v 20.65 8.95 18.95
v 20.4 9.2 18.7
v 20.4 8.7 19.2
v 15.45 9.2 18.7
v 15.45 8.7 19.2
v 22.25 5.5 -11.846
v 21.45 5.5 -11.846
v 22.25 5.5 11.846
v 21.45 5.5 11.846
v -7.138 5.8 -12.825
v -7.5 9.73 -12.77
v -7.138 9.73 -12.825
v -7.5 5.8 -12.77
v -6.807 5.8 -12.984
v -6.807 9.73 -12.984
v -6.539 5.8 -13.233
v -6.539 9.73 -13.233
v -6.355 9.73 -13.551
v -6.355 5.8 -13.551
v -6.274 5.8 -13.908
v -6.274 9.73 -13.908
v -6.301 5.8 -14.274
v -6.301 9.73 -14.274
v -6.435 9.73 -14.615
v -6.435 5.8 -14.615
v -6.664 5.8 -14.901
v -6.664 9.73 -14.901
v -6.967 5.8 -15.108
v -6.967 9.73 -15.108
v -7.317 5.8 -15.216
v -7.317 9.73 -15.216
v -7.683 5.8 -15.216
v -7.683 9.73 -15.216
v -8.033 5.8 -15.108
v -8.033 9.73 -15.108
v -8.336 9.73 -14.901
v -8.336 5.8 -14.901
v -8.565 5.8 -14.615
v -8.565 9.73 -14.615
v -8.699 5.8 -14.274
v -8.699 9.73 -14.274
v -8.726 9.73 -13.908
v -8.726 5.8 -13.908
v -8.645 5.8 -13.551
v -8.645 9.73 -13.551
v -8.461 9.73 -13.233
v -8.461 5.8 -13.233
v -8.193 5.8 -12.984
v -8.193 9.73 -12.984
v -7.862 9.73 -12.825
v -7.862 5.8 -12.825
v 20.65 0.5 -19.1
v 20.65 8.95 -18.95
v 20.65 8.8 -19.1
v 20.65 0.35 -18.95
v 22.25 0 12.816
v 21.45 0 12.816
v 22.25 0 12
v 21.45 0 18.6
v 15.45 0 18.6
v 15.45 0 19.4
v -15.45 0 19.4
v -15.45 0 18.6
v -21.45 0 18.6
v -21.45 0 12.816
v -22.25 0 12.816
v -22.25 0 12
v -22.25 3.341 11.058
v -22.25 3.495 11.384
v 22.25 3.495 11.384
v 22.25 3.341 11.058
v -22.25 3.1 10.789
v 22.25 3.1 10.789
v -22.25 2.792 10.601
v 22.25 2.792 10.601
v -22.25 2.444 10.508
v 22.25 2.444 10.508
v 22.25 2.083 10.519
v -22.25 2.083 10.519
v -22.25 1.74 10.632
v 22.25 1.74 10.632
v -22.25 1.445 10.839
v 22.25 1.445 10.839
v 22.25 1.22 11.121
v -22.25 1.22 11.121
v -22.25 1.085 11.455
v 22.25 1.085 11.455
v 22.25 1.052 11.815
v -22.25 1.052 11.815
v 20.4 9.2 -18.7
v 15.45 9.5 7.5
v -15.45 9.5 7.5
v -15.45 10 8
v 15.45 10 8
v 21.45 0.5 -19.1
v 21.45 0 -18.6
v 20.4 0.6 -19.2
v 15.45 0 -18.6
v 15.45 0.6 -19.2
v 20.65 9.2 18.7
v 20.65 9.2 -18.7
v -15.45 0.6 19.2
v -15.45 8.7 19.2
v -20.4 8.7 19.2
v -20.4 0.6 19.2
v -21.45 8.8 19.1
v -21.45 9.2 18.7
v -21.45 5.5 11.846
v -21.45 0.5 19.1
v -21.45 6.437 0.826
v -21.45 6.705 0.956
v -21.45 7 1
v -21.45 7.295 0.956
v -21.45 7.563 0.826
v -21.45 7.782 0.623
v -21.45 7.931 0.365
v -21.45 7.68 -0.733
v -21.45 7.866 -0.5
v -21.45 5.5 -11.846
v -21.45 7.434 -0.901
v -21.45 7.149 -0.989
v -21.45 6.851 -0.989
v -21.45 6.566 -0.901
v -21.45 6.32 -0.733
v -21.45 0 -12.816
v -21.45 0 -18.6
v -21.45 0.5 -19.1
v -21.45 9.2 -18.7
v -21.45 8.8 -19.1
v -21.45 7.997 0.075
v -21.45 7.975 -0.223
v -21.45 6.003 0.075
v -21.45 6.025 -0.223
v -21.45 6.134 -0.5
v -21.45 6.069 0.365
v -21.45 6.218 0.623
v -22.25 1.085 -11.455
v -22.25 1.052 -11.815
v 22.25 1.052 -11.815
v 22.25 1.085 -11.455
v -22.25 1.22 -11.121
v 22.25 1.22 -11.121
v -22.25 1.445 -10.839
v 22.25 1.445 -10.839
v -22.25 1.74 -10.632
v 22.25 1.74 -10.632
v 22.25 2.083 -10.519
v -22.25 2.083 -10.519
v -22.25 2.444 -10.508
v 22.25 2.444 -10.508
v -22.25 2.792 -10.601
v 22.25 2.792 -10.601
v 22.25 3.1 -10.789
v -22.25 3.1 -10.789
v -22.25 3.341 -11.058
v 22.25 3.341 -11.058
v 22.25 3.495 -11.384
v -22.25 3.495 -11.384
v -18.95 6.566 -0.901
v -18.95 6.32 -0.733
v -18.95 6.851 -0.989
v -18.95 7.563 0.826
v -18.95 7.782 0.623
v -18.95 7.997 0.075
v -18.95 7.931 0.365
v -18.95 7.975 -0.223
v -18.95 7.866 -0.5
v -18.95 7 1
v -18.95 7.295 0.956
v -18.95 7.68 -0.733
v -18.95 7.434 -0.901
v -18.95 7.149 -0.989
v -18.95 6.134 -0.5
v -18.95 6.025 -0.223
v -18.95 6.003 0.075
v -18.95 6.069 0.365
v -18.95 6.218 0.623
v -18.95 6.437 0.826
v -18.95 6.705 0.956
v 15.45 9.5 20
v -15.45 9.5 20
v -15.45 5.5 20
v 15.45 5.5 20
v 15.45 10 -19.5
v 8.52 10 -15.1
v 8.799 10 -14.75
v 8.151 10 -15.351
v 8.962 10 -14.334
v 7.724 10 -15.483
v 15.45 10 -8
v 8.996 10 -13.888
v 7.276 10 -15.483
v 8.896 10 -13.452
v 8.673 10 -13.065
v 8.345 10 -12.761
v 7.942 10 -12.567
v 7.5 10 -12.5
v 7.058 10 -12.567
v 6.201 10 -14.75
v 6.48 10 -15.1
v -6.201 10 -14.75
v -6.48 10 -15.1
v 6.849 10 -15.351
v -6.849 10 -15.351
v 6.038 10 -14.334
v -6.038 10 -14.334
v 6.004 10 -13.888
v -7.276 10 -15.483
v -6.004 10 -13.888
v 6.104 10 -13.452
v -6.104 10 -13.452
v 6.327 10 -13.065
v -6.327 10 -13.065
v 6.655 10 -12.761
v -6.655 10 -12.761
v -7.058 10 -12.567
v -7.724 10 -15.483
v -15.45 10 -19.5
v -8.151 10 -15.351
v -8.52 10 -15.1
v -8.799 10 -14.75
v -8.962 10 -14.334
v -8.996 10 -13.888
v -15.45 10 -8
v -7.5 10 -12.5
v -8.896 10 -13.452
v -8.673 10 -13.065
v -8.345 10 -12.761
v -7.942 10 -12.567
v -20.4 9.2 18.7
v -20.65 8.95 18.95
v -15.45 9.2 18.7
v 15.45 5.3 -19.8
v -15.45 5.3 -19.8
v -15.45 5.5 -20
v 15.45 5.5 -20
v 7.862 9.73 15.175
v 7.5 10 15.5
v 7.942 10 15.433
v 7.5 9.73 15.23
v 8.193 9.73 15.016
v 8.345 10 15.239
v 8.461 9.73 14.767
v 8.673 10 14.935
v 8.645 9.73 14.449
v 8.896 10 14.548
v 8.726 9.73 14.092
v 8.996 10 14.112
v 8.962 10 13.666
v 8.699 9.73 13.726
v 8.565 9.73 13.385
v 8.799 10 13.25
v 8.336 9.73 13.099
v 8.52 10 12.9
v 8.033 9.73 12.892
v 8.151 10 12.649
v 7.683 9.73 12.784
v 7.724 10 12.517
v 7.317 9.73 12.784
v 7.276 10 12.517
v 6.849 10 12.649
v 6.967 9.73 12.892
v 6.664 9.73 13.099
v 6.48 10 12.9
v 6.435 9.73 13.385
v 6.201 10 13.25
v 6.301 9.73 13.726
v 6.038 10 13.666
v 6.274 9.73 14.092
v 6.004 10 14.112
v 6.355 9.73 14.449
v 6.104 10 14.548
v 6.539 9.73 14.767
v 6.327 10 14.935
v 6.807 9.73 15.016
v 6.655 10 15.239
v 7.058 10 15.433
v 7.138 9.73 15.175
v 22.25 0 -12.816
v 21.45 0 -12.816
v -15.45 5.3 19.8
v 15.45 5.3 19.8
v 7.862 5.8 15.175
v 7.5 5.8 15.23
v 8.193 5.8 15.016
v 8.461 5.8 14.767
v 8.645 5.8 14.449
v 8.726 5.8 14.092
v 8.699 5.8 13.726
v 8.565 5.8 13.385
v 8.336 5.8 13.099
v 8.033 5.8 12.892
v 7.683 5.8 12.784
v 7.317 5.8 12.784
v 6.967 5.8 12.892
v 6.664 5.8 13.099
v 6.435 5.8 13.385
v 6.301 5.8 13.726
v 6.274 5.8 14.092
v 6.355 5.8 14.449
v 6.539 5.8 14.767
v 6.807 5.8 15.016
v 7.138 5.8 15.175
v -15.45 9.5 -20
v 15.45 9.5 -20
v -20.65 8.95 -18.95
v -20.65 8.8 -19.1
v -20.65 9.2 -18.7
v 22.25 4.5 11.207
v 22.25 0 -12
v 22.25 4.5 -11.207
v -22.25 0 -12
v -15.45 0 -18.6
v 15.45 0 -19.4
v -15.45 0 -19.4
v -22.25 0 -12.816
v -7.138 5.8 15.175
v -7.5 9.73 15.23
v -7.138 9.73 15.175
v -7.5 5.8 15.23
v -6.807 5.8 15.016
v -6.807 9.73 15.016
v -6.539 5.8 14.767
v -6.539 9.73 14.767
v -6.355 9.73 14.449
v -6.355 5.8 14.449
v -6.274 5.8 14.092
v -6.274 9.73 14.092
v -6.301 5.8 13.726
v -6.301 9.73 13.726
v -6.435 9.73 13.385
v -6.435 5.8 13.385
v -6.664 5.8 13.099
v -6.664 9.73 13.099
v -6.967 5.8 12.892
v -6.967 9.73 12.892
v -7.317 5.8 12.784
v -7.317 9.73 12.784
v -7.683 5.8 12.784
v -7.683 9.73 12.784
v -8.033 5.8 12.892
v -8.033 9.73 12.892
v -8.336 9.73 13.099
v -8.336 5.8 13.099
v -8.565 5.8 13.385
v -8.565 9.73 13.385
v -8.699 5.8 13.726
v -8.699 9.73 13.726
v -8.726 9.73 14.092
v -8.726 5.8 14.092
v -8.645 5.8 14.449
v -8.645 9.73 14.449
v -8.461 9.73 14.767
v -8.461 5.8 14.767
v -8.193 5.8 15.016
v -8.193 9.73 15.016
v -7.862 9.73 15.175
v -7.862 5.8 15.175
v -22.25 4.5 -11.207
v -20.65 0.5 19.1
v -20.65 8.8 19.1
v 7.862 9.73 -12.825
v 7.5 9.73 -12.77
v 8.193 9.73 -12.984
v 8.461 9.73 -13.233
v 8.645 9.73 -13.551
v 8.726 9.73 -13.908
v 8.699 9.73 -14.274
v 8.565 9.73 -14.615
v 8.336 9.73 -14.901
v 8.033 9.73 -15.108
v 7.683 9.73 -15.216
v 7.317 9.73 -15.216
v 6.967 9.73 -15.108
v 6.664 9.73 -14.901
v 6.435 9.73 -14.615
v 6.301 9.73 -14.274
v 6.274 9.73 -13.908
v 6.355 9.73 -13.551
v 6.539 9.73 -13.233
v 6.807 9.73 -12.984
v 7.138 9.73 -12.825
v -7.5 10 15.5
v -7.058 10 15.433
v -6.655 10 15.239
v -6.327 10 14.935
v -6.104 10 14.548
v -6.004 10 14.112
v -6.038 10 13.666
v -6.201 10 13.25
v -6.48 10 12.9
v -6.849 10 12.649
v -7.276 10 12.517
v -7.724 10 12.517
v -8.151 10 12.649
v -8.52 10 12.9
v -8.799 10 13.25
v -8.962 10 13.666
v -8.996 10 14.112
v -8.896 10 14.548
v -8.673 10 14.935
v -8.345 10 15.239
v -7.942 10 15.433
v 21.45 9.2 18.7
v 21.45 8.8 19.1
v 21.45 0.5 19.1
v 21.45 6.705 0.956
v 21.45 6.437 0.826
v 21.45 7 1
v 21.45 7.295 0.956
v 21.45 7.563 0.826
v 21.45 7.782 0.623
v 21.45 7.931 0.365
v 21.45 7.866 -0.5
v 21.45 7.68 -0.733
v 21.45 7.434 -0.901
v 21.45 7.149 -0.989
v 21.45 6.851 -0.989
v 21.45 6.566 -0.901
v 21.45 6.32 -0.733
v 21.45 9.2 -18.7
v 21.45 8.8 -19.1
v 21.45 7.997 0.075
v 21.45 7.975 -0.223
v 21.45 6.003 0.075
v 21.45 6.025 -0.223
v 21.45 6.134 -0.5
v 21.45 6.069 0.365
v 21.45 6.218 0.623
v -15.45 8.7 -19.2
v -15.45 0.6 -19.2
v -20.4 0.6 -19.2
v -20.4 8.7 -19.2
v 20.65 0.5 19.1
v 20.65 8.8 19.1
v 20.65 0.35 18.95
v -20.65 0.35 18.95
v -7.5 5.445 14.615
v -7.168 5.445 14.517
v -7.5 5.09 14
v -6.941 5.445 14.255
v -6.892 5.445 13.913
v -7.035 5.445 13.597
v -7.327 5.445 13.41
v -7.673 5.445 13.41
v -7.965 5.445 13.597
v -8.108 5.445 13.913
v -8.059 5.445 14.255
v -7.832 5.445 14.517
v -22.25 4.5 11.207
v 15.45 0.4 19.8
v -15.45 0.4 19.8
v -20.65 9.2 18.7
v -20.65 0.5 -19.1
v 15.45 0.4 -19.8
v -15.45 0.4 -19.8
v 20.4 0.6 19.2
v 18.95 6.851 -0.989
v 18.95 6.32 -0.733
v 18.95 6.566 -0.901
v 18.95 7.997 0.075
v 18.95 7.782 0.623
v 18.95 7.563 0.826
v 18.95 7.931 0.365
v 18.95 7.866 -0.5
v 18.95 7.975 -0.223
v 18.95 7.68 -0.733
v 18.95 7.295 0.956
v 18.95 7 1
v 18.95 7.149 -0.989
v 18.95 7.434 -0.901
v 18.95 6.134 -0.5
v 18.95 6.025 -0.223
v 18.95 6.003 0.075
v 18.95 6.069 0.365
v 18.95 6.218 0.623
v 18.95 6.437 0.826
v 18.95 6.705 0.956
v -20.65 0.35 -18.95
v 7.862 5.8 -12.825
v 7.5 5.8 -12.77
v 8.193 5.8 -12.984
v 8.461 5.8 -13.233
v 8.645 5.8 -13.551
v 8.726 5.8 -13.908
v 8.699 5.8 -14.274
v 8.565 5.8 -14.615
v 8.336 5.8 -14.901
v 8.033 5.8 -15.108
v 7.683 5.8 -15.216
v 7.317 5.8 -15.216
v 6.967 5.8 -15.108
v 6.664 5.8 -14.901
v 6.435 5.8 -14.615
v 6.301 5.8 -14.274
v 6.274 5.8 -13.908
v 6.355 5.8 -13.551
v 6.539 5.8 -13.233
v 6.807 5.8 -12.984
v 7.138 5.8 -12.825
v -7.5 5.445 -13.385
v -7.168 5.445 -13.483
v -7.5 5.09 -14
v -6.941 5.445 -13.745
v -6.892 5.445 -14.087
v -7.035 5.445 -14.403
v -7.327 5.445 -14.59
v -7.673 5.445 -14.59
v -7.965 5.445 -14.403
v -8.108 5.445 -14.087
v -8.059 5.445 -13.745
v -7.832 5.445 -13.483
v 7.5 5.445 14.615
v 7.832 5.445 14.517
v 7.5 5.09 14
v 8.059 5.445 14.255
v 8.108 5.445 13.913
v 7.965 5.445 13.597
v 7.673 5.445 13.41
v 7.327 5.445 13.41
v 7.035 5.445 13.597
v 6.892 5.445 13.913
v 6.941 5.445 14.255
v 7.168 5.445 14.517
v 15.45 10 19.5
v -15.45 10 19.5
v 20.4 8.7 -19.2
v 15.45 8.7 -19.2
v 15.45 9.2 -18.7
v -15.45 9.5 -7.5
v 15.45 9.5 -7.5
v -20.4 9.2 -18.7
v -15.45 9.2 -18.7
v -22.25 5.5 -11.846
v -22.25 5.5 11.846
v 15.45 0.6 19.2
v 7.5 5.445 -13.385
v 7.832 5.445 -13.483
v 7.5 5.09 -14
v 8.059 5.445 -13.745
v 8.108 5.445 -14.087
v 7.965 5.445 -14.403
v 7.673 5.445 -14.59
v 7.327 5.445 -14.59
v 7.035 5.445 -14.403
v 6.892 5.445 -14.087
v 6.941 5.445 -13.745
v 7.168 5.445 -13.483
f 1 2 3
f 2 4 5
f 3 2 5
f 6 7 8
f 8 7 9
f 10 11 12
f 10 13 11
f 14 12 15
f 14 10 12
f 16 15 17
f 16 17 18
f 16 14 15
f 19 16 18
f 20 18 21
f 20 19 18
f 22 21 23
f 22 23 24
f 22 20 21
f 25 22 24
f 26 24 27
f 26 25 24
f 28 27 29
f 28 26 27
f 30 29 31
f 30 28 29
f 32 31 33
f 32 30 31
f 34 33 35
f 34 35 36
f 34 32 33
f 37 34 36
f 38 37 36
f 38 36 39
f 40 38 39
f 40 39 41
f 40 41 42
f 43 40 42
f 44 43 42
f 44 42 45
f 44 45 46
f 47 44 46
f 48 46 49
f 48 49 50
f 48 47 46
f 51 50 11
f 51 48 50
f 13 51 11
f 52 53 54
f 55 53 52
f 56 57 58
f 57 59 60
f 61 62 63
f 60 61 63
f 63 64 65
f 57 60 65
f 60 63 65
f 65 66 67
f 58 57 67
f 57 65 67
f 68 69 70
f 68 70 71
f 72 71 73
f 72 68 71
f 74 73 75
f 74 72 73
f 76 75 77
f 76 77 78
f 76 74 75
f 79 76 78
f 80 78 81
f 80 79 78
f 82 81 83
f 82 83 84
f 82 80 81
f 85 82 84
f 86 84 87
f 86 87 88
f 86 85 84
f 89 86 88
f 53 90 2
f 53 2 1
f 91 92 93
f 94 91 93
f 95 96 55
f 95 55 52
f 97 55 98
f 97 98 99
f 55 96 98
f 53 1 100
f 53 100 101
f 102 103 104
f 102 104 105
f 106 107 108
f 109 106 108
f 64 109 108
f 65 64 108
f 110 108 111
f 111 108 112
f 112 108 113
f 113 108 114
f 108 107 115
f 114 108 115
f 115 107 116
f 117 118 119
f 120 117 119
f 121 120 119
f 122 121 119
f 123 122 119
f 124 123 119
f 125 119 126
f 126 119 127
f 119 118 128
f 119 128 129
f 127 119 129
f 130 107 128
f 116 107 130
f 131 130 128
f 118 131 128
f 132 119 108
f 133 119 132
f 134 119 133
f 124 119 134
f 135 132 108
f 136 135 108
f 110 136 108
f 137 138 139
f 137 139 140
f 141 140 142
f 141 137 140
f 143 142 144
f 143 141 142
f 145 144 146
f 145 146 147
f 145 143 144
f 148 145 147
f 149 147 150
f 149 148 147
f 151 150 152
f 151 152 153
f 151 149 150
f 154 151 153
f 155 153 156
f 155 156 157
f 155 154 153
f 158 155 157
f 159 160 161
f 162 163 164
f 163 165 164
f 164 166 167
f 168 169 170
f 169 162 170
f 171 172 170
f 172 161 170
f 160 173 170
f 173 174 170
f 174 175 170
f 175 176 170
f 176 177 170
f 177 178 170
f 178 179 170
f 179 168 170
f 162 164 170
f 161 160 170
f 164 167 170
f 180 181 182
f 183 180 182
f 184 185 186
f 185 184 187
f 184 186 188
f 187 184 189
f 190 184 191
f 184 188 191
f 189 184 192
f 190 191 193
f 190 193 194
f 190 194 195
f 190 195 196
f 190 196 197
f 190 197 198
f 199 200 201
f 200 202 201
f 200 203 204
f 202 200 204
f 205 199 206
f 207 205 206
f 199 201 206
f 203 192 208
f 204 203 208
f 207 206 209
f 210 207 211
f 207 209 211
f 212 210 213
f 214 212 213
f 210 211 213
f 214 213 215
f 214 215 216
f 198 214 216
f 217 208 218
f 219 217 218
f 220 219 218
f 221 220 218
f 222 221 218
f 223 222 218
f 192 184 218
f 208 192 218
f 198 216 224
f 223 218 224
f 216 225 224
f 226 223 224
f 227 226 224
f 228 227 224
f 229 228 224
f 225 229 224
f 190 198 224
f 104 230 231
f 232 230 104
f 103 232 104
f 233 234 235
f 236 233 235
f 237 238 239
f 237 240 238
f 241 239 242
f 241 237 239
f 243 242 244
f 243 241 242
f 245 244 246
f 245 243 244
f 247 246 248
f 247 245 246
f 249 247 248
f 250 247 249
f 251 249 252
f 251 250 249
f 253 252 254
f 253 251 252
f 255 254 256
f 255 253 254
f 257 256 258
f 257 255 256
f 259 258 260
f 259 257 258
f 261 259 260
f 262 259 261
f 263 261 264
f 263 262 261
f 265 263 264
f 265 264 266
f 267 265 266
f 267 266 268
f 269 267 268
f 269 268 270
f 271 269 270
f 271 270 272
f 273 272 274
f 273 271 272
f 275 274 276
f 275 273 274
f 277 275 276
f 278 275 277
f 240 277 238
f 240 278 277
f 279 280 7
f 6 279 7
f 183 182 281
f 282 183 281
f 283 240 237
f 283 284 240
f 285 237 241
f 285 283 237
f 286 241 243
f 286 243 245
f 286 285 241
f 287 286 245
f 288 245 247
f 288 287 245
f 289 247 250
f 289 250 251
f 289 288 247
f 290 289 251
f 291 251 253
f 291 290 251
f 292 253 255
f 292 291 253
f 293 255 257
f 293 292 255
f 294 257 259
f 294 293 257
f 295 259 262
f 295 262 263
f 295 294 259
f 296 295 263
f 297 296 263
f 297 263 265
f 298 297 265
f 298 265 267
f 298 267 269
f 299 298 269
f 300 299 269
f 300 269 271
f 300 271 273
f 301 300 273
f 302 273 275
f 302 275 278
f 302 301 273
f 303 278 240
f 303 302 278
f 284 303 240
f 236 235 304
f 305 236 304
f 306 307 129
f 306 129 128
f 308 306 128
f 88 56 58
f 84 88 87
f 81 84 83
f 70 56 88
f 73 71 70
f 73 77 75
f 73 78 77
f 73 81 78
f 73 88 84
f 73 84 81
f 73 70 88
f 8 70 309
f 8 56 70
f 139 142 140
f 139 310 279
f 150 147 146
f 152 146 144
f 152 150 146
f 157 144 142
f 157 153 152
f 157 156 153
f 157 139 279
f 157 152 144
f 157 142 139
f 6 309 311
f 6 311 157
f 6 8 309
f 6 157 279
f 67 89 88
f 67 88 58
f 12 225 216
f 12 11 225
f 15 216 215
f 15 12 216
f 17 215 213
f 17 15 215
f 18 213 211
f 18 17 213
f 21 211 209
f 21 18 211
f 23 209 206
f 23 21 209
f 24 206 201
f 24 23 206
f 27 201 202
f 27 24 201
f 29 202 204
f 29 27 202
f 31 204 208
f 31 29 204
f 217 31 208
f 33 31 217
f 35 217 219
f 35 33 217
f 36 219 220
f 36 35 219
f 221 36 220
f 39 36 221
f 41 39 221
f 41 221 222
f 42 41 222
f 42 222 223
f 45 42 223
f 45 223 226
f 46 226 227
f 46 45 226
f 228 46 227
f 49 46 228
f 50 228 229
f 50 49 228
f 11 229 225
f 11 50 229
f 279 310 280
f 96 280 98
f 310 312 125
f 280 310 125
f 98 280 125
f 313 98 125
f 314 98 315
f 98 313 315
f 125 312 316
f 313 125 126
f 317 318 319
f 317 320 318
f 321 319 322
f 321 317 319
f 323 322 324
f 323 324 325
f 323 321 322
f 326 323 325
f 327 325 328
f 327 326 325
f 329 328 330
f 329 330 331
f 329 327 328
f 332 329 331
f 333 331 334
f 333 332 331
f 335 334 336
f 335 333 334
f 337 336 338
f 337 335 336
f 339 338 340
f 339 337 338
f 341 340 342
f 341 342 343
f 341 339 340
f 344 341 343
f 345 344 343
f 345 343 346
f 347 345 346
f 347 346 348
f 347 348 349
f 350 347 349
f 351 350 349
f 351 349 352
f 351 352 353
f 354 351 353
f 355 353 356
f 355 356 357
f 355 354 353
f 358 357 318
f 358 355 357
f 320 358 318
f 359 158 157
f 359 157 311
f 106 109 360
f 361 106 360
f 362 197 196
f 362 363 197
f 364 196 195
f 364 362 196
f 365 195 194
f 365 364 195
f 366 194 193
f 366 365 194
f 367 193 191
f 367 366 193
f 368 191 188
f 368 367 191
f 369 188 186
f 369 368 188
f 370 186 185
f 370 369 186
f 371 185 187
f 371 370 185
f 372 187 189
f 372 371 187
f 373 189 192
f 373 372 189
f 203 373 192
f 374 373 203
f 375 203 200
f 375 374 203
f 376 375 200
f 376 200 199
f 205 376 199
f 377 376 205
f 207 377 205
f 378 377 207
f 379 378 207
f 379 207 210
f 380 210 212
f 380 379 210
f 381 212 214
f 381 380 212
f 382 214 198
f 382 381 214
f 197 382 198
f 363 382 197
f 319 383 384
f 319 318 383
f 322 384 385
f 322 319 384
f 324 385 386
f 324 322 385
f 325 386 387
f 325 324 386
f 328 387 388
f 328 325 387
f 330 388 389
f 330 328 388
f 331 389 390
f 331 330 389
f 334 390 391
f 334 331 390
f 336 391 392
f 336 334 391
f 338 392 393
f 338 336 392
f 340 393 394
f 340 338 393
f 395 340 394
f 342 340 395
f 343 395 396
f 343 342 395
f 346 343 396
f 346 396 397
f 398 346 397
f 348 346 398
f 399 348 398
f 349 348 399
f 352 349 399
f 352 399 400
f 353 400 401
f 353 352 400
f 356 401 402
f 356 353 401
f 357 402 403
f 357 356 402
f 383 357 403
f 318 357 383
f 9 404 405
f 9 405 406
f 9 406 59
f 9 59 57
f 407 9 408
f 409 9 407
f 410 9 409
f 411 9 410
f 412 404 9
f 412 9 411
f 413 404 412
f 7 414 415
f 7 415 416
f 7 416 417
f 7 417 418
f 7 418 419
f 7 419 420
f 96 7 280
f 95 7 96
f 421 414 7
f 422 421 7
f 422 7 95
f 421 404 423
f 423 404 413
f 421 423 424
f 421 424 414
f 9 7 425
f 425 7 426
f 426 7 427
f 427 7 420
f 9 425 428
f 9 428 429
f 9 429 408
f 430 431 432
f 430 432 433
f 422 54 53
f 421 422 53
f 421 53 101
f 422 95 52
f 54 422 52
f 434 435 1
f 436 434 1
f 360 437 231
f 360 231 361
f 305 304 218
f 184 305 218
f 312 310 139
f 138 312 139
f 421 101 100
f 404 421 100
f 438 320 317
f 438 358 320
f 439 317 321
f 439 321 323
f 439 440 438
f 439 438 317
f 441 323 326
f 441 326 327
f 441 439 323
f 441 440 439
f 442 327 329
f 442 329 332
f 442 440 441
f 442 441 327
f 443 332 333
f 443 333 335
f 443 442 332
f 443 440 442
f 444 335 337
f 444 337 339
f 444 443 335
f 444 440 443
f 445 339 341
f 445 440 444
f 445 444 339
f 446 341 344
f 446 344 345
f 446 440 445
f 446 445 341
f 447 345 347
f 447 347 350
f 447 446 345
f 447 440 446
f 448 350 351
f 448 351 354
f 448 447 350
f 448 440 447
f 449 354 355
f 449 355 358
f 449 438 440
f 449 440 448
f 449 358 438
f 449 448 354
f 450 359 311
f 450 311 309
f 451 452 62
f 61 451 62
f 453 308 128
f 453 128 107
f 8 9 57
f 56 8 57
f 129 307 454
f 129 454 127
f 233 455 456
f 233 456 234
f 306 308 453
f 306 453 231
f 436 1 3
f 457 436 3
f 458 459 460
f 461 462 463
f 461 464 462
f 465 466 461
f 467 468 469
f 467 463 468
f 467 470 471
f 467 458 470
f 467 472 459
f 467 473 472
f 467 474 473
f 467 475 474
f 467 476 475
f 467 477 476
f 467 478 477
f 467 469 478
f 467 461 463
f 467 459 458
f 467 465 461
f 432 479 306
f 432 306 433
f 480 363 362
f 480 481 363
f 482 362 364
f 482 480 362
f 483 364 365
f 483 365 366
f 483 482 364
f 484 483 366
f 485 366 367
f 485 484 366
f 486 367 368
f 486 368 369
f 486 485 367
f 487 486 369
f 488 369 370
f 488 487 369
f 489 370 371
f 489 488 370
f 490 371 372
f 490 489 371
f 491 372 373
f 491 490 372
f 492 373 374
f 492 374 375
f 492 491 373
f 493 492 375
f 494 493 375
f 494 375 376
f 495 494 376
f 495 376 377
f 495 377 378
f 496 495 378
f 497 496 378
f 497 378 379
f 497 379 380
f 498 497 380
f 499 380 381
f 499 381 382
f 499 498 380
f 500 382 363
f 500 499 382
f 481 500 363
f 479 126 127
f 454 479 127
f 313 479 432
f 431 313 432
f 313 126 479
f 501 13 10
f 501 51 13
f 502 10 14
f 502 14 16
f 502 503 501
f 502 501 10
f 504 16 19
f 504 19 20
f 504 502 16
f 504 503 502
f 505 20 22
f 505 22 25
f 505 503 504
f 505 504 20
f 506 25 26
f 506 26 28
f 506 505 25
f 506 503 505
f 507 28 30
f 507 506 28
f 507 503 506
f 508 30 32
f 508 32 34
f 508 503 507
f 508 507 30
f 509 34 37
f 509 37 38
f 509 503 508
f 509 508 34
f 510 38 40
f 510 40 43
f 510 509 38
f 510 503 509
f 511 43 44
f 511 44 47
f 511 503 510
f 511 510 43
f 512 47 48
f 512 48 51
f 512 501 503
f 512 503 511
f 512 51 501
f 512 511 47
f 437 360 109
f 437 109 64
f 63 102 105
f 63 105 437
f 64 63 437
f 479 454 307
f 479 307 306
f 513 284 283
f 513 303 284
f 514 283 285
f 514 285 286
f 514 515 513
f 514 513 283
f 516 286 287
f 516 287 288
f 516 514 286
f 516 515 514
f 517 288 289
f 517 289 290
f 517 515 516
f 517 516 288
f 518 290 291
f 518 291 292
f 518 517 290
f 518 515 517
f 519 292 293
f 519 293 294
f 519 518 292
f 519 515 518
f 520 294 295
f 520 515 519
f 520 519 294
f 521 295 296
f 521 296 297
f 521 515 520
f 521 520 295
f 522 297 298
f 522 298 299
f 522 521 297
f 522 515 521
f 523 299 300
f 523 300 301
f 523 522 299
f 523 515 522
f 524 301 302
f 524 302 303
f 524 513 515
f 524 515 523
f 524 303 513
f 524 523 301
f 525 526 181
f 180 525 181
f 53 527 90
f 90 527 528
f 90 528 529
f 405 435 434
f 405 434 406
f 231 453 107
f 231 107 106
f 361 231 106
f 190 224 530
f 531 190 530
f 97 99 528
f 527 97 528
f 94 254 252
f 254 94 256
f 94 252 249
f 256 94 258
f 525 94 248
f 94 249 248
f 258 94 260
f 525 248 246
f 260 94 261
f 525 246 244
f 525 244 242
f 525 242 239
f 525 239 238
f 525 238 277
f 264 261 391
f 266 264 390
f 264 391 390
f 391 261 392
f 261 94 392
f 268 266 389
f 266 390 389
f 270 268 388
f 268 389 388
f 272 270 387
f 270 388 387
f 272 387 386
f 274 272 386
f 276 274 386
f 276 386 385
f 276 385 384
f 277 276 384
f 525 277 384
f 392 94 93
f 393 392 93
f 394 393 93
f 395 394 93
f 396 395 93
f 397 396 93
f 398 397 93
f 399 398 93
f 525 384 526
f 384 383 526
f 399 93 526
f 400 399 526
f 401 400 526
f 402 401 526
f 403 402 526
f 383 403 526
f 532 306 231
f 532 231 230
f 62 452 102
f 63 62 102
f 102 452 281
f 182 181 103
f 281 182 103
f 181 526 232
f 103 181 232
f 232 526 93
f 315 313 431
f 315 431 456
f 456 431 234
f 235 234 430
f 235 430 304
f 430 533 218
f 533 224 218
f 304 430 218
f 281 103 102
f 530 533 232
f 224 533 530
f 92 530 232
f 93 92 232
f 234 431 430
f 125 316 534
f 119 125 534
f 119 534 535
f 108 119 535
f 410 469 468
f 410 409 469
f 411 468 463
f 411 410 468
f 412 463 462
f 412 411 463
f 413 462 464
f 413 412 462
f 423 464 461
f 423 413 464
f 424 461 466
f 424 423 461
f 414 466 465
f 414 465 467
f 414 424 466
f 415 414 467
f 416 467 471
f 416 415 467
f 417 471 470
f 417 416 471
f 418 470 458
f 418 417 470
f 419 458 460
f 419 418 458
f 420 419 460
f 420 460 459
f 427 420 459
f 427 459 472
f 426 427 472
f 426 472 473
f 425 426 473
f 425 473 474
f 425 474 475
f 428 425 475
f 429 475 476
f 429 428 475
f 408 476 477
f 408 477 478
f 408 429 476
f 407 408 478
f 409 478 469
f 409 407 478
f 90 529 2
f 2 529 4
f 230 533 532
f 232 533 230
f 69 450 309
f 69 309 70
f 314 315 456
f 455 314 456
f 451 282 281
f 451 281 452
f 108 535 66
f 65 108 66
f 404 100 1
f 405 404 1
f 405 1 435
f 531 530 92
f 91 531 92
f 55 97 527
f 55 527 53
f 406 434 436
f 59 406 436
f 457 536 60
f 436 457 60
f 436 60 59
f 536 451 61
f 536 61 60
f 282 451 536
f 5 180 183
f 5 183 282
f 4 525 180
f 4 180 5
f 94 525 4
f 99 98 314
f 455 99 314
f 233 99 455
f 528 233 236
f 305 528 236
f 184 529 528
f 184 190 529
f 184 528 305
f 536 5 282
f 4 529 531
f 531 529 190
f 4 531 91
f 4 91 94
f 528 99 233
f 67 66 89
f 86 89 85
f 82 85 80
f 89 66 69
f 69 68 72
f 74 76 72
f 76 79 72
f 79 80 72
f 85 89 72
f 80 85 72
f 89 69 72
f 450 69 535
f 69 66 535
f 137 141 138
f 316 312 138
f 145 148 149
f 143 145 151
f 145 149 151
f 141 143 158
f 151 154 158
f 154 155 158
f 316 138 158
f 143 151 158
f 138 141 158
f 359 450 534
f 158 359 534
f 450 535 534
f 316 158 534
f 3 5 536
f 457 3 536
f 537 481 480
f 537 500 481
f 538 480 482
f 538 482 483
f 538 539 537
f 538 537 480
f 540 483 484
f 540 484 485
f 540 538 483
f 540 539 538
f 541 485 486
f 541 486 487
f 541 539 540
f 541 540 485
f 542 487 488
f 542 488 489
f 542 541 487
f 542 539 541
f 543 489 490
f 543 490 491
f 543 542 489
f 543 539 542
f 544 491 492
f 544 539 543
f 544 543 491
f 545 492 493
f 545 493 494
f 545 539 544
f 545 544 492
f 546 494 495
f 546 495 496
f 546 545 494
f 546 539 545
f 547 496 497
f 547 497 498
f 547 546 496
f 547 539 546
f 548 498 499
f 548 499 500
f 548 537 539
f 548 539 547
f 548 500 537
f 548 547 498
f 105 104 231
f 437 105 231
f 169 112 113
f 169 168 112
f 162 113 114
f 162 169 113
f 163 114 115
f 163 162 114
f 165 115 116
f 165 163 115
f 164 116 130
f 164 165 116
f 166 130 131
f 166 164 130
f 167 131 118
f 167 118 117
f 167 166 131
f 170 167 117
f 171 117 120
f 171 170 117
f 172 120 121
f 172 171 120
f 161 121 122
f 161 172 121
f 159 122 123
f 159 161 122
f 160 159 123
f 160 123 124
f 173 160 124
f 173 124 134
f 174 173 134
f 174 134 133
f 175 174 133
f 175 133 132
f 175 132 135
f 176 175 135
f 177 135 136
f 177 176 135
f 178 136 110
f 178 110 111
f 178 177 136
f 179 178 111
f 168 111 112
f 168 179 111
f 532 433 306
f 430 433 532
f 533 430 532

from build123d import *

# Parameters (mm, degrees)
RESSALTO_EXTRUS_O1_DEPTH      = 15.45
RESSALTO_EXTRUS_O1_DEPTH_BACK = 15.45
RESSALTO_EXTRUS_O2_DEPTH      = 6
RESSALTO_EXTRUS_O3_DEPTH      = 6
RESSALTO_EXTRUS_O4_DEPTH      = 22.25
RESSALTO_EXTRUS_O4_DEPTH_BACK = 22.25
CORTE_EXTRUS_O1_DEPTH         = 22.25
CORTE_EXTRUS_O1_DEPTH_BACK    = 22.25
ESBO_O10_W                    = 48.5
ESBO_O10_H                    = 44
CORTE_EXTRUS_O2_DEPTH         = 11
CORTE_EXTRUS_O3_DEPTH         = 20
CORTE_EXTRUS_O3_DEPTH_BACK    = 20
CORTE_EXTRUS_O4_DEPTH         = 20
CORTE_EXTRUS_O4_DEPTH_BACK    = 20
CORTE_EXTRUS_O5_DEPTH         = 10
CORTE_EXTRUS_O6_DEPTH         = 10
CORTE_EXTRUS_O7_DEPTH         = 10
CORTE_EXTRUS_O8_DEPTH         = 10
ESBO_O17_W                    = 2.5
ESBO_O17_H                    = 1
ESBO_O18_W                    = 2.5
ESBO_O18_H                    = 1


with BuildPart() as part:
    # Esboço1 → Ressalto-extrusão1 (new, two sides: drawn at the far end of the back side and taken through both)
    with BuildSketch(Plane(origin=(0, 0, 0), x_dir=(0, 0, -1), z_dir=(1, 0, 0)).offset(-RESSALTO_EXTRUS_O1_DEPTH_BACK)):
        Polygon((-20, 9.5), (-20, 5.5), (-19.8, 5.3), (-19.8, 0.4), (-19.4, 0), (19.4, 0), (19.8, 0.4), (19.8, 5.3), (20, 5.5), (20, 9.5), (19.5, 10), (8, 10), (7.5, 9.5), (-7.5, 9.5), (-8, 10), (-19.5, 10), align=None)
    extrude(amount=RESSALTO_EXTRUS_O1_DEPTH + RESSALTO_EXTRUS_O1_DEPTH_BACK)

    # Esboço2 → Ressalto-extrusão2 (add)
    with BuildSketch(Plane(origin=(-15.45, 0, 0), x_dir=(0, 0, -1), z_dir=(1, 0, 0))):
        Polygon((-19.2, 8.7), (-19.2, 0.6), (-18.6, 0), (18.6, 0), (19.2, 0.6), (19.2, 8.7), (18.7, 9.2), (-18.7, 9.2), align=None)
    extrude(amount=-RESSALTO_EXTRUS_O2_DEPTH)

    # Esboço3 → Ressalto-extrusão3 (add)
    with BuildSketch(Plane(origin=(15.45, 0, 0), x_dir=(0, 0, -1), z_dir=(1, 0, 0))):
        Polygon((-19.2, 8.7), (-19.2, 0.6), (-18.6, 0), (18.6, 0), (19.2, 0.6), (19.2, 8.7), (18.7, 9.2), (-18.7, 9.2), align=None)
    extrude(amount=RESSALTO_EXTRUS_O3_DEPTH)

    # Esboço4 → Ressalto-extrusão4 (add, two sides: drawn at the far end of the back side and taken through both)
    with BuildSketch(Plane(origin=(0, 0, 0), x_dir=(0, 0, -1), z_dir=(1, 0, 0)).offset(-RESSALTO_EXTRUS_O4_DEPTH_BACK)):
        Polygon((-12.816, 0), (12.816, 0), (11.846201606, 5.5), (-11.846201606, 5.5), align=None)
    extrude(amount=RESSALTO_EXTRUS_O4_DEPTH + RESSALTO_EXTRUS_O4_DEPTH_BACK)

    # Esboço5 → Corte-extrusão1 (cut, two sides: drawn at the far end of the back side and taken through both)
    with BuildSketch(Plane(origin=(0, 0, 0), x_dir=(0, 0, -1), z_dir=(1, 0, 0)).offset(-CORTE_EXTRUS_O1_DEPTH_BACK)):
        with BuildLine():
            Line((-12, 0), (12, 0))
            Line((12, 0), (11.814562479, 1.051668439))
            ThreePointArc((11.814562479, 1.051668439), (10.518990309, 2.082939778), (11.383714346, 3.495129625))
            Line((11.383714346, 3.495129625), (11.206528587, 4.5))
            Line((11.206528587, 4.5), (-11.206528587, 4.5))
            Line((-11.206528587, 4.5), (-11.383714346, 3.495129625))
            ThreePointArc((-11.383714346, 3.495129625), (-10.518990309, 2.082939778), (-11.814562479, 1.051668439))
            Line((-11.814562479, 1.051668439), (-12, 0))
        make_face()
    extrude(amount=CORTE_EXTRUS_O1_DEPTH + CORTE_EXTRUS_O1_DEPTH_BACK, mode=Mode.SUBTRACT)

    # Esboço6 → Corte-Revolução1 (revolve, cut)
    with BuildSketch(Plane.XY.offset(14), mode=Mode.PRIVATE) as corte_revolu_o1_sk:
        Polygon((7.5, 10), (9, 10), (8.7295, 9.7295), (8.7295, 5.8), (7.5, 5.090147844), align=None)
    revolve(corte_revolu_o1_sk.sketch.rotate(Axis((7.5, 5.090147844, 14), (0, 1, 0)), 270), axis=Axis((7.5, 5.090147844, 14), (0, 1, 0)), mode=Mode.SUBTRACT)

    # Esboço7 → Corte-Revolução2 (revolve, cut)
    with BuildSketch(Plane.XY.offset(-14), mode=Mode.PRIVATE) as corte_revolu_o2_sk:
        Polygon((-7.5, 10), (-6, 10), (-6.2705, 9.7295), (-6.2705, 5.8), (-7.5, 5.090147844), align=None)
    revolve(corte_revolu_o2_sk.sketch.rotate(Axis((-7.5, 5.090147844, -14), (0, 1, 0)), 270), axis=Axis((-7.5, 5.090147844, -14), (0, 1, 0)), mode=Mode.SUBTRACT)

    # Esboço8 → Corte-Revolução3 (revolve, cut)
    with BuildSketch(Plane.XY.offset(14), mode=Mode.PRIVATE) as corte_revolu_o3_sk:
        Polygon((-7.5, 10), (-6, 10), (-6.2705, 9.7295), (-6.2705, 5.8), (-7.5, 5.090147844), align=None)
    revolve(corte_revolu_o3_sk.sketch.rotate(Axis((-7.5, 5.090147844, 14), (0, 1, 0)), 270), axis=Axis((-7.5, 5.090147844, 14), (0, 1, 0)), mode=Mode.SUBTRACT)

    # Esboço9 → Corte-Revolução4 (revolve, cut)
    with BuildSketch(Plane.XY.offset(-14), mode=Mode.PRIVATE) as corte_revolu_o4_sk:
        Polygon((7.5, 10), (9, 10), (8.7295, 9.7295), (8.7295, 5.8), (7.5, 5.090147844), align=None)
    revolve(corte_revolu_o4_sk.sketch.rotate(Axis((7.5, 5.090147844, -14), (0, 1, 0)), 270), axis=Axis((7.5, 5.090147844, -14), (0, 1, 0)), mode=Mode.SUBTRACT)

    # Esboço10 → Corte-extrusão2 (cut)
    with BuildSketch(Plane(origin=(0, 0, 0), x_dir=(1, 0, 0), z_dir=(0, 1, 0))):
        Rectangle(ESBO_O10_W, ESBO_O10_H)
        Polygon((-23.25, 19.1), (-23.25, -19.1), (-20.65, -19.1), (-20.65, -21), (20.65, -21), (20.65, -19.1), (23.25, -19.1), (23.25, 19.1), (20.65, 19.1), (20.65, 21), (-20.65, 21), (-20.65, 19.1), align=None, mode=Mode.SUBTRACT)
    extrude(amount=CORTE_EXTRUS_O2_DEPTH, mode=Mode.SUBTRACT)

    # Esboço11 → Corte-extrusão3 (cut, two sides: drawn at the far end of the back side and taken through both)
    with BuildSketch(Plane.XY.offset(-CORTE_EXTRUS_O3_DEPTH_BACK)):
        Polygon((-20.65, 9.2), (-20.65, 8.95), (-20.4, 9.2), align=None)
    extrude(amount=CORTE_EXTRUS_O3_DEPTH + CORTE_EXTRUS_O3_DEPTH_BACK, mode=Mode.SUBTRACT)

    # Esboço12 → Corte-extrusão4 (cut, two sides: drawn at the far end of the back side and taken through both)
    with BuildSketch(Plane.XY.offset(-CORTE_EXTRUS_O4_DEPTH_BACK)):
        Polygon((20.4, 9.2), (20.65, 8.95), (20.65, 9.2), align=None)
    extrude(amount=CORTE_EXTRUS_O4_DEPTH + CORTE_EXTRUS_O4_DEPTH_BACK, mode=Mode.SUBTRACT)

    # Esboço13 → Corte-extrusão5 (cut)
    with BuildSketch(Plane(origin=(0, 0, 0), x_dir=(1, 0, 0), z_dir=(0, 1, 0))):
        Polygon((-20.65, 19.2), (-20.65, 18.95), (-20.4, 19.2), align=None)
    extrude(amount=CORTE_EXTRUS_O5_DEPTH, mode=Mode.SUBTRACT)

    # Esboço14 → Corte-extrusão6 (cut)
    with BuildSketch(Plane(origin=(0, 0, 0), x_dir=(1, 0, 0), z_dir=(0, 1, 0))):
        Polygon((-20.65, -19.2), (-20.4, -19.2), (-20.65, -18.95), align=None)
    extrude(amount=CORTE_EXTRUS_O6_DEPTH, mode=Mode.SUBTRACT)

    # Esboço15 → Corte-extrusão7 (cut)
    with BuildSketch(Plane(origin=(0, 0, 0), x_dir=(1, 0, 0), z_dir=(0, 1, 0))):
        Polygon((20.4, 19.2), (20.65, 18.95), (20.65, 19.2), align=None)
    extrude(amount=CORTE_EXTRUS_O7_DEPTH, mode=Mode.SUBTRACT)

    # Esboço16 → Corte-extrusão8 (cut)
    with BuildSketch(Plane(origin=(0, 0, 0), x_dir=(1, 0, 0), z_dir=(0, 1, 0))):
        Polygon((20.4, -19.2), (20.65, -19.2), (20.65, -18.95), align=None)
    extrude(amount=CORTE_EXTRUS_O8_DEPTH, mode=Mode.SUBTRACT)

    # Esboço17 → Corte-Revolução5 (revolve, cut)
    with BuildSketch(Plane.XY, mode=Mode.PRIVATE) as corte_revolu_o5_sk:
        with Locations((-20.2, 7.5)):
            Rectangle(ESBO_O17_W, ESBO_O17_H)
    revolve(corte_revolu_o5_sk.sketch.rotate(Axis((-18.95, 7, 0), (-1, 0, 0)), 270), axis=Axis((-18.95, 7, 0), (-1, 0, 0)), mode=Mode.SUBTRACT)

    # Esboço18 → Corte-Revolução6 (revolve, cut)
    with BuildSketch(Plane.XY, mode=Mode.PRIVATE) as corte_revolu_o6_sk:
        with Locations((20.2, 7.5)):
            Rectangle(ESBO_O18_W, ESBO_O18_H)
    revolve(corte_revolu_o6_sk.sketch.rotate(Axis((21.45, 7, 0), (-1, 0, 0)), 270), axis=Axis((21.45, 7, 0), (-1, 0, 0)), mode=Mode.SUBTRACT)


solid = part.part
